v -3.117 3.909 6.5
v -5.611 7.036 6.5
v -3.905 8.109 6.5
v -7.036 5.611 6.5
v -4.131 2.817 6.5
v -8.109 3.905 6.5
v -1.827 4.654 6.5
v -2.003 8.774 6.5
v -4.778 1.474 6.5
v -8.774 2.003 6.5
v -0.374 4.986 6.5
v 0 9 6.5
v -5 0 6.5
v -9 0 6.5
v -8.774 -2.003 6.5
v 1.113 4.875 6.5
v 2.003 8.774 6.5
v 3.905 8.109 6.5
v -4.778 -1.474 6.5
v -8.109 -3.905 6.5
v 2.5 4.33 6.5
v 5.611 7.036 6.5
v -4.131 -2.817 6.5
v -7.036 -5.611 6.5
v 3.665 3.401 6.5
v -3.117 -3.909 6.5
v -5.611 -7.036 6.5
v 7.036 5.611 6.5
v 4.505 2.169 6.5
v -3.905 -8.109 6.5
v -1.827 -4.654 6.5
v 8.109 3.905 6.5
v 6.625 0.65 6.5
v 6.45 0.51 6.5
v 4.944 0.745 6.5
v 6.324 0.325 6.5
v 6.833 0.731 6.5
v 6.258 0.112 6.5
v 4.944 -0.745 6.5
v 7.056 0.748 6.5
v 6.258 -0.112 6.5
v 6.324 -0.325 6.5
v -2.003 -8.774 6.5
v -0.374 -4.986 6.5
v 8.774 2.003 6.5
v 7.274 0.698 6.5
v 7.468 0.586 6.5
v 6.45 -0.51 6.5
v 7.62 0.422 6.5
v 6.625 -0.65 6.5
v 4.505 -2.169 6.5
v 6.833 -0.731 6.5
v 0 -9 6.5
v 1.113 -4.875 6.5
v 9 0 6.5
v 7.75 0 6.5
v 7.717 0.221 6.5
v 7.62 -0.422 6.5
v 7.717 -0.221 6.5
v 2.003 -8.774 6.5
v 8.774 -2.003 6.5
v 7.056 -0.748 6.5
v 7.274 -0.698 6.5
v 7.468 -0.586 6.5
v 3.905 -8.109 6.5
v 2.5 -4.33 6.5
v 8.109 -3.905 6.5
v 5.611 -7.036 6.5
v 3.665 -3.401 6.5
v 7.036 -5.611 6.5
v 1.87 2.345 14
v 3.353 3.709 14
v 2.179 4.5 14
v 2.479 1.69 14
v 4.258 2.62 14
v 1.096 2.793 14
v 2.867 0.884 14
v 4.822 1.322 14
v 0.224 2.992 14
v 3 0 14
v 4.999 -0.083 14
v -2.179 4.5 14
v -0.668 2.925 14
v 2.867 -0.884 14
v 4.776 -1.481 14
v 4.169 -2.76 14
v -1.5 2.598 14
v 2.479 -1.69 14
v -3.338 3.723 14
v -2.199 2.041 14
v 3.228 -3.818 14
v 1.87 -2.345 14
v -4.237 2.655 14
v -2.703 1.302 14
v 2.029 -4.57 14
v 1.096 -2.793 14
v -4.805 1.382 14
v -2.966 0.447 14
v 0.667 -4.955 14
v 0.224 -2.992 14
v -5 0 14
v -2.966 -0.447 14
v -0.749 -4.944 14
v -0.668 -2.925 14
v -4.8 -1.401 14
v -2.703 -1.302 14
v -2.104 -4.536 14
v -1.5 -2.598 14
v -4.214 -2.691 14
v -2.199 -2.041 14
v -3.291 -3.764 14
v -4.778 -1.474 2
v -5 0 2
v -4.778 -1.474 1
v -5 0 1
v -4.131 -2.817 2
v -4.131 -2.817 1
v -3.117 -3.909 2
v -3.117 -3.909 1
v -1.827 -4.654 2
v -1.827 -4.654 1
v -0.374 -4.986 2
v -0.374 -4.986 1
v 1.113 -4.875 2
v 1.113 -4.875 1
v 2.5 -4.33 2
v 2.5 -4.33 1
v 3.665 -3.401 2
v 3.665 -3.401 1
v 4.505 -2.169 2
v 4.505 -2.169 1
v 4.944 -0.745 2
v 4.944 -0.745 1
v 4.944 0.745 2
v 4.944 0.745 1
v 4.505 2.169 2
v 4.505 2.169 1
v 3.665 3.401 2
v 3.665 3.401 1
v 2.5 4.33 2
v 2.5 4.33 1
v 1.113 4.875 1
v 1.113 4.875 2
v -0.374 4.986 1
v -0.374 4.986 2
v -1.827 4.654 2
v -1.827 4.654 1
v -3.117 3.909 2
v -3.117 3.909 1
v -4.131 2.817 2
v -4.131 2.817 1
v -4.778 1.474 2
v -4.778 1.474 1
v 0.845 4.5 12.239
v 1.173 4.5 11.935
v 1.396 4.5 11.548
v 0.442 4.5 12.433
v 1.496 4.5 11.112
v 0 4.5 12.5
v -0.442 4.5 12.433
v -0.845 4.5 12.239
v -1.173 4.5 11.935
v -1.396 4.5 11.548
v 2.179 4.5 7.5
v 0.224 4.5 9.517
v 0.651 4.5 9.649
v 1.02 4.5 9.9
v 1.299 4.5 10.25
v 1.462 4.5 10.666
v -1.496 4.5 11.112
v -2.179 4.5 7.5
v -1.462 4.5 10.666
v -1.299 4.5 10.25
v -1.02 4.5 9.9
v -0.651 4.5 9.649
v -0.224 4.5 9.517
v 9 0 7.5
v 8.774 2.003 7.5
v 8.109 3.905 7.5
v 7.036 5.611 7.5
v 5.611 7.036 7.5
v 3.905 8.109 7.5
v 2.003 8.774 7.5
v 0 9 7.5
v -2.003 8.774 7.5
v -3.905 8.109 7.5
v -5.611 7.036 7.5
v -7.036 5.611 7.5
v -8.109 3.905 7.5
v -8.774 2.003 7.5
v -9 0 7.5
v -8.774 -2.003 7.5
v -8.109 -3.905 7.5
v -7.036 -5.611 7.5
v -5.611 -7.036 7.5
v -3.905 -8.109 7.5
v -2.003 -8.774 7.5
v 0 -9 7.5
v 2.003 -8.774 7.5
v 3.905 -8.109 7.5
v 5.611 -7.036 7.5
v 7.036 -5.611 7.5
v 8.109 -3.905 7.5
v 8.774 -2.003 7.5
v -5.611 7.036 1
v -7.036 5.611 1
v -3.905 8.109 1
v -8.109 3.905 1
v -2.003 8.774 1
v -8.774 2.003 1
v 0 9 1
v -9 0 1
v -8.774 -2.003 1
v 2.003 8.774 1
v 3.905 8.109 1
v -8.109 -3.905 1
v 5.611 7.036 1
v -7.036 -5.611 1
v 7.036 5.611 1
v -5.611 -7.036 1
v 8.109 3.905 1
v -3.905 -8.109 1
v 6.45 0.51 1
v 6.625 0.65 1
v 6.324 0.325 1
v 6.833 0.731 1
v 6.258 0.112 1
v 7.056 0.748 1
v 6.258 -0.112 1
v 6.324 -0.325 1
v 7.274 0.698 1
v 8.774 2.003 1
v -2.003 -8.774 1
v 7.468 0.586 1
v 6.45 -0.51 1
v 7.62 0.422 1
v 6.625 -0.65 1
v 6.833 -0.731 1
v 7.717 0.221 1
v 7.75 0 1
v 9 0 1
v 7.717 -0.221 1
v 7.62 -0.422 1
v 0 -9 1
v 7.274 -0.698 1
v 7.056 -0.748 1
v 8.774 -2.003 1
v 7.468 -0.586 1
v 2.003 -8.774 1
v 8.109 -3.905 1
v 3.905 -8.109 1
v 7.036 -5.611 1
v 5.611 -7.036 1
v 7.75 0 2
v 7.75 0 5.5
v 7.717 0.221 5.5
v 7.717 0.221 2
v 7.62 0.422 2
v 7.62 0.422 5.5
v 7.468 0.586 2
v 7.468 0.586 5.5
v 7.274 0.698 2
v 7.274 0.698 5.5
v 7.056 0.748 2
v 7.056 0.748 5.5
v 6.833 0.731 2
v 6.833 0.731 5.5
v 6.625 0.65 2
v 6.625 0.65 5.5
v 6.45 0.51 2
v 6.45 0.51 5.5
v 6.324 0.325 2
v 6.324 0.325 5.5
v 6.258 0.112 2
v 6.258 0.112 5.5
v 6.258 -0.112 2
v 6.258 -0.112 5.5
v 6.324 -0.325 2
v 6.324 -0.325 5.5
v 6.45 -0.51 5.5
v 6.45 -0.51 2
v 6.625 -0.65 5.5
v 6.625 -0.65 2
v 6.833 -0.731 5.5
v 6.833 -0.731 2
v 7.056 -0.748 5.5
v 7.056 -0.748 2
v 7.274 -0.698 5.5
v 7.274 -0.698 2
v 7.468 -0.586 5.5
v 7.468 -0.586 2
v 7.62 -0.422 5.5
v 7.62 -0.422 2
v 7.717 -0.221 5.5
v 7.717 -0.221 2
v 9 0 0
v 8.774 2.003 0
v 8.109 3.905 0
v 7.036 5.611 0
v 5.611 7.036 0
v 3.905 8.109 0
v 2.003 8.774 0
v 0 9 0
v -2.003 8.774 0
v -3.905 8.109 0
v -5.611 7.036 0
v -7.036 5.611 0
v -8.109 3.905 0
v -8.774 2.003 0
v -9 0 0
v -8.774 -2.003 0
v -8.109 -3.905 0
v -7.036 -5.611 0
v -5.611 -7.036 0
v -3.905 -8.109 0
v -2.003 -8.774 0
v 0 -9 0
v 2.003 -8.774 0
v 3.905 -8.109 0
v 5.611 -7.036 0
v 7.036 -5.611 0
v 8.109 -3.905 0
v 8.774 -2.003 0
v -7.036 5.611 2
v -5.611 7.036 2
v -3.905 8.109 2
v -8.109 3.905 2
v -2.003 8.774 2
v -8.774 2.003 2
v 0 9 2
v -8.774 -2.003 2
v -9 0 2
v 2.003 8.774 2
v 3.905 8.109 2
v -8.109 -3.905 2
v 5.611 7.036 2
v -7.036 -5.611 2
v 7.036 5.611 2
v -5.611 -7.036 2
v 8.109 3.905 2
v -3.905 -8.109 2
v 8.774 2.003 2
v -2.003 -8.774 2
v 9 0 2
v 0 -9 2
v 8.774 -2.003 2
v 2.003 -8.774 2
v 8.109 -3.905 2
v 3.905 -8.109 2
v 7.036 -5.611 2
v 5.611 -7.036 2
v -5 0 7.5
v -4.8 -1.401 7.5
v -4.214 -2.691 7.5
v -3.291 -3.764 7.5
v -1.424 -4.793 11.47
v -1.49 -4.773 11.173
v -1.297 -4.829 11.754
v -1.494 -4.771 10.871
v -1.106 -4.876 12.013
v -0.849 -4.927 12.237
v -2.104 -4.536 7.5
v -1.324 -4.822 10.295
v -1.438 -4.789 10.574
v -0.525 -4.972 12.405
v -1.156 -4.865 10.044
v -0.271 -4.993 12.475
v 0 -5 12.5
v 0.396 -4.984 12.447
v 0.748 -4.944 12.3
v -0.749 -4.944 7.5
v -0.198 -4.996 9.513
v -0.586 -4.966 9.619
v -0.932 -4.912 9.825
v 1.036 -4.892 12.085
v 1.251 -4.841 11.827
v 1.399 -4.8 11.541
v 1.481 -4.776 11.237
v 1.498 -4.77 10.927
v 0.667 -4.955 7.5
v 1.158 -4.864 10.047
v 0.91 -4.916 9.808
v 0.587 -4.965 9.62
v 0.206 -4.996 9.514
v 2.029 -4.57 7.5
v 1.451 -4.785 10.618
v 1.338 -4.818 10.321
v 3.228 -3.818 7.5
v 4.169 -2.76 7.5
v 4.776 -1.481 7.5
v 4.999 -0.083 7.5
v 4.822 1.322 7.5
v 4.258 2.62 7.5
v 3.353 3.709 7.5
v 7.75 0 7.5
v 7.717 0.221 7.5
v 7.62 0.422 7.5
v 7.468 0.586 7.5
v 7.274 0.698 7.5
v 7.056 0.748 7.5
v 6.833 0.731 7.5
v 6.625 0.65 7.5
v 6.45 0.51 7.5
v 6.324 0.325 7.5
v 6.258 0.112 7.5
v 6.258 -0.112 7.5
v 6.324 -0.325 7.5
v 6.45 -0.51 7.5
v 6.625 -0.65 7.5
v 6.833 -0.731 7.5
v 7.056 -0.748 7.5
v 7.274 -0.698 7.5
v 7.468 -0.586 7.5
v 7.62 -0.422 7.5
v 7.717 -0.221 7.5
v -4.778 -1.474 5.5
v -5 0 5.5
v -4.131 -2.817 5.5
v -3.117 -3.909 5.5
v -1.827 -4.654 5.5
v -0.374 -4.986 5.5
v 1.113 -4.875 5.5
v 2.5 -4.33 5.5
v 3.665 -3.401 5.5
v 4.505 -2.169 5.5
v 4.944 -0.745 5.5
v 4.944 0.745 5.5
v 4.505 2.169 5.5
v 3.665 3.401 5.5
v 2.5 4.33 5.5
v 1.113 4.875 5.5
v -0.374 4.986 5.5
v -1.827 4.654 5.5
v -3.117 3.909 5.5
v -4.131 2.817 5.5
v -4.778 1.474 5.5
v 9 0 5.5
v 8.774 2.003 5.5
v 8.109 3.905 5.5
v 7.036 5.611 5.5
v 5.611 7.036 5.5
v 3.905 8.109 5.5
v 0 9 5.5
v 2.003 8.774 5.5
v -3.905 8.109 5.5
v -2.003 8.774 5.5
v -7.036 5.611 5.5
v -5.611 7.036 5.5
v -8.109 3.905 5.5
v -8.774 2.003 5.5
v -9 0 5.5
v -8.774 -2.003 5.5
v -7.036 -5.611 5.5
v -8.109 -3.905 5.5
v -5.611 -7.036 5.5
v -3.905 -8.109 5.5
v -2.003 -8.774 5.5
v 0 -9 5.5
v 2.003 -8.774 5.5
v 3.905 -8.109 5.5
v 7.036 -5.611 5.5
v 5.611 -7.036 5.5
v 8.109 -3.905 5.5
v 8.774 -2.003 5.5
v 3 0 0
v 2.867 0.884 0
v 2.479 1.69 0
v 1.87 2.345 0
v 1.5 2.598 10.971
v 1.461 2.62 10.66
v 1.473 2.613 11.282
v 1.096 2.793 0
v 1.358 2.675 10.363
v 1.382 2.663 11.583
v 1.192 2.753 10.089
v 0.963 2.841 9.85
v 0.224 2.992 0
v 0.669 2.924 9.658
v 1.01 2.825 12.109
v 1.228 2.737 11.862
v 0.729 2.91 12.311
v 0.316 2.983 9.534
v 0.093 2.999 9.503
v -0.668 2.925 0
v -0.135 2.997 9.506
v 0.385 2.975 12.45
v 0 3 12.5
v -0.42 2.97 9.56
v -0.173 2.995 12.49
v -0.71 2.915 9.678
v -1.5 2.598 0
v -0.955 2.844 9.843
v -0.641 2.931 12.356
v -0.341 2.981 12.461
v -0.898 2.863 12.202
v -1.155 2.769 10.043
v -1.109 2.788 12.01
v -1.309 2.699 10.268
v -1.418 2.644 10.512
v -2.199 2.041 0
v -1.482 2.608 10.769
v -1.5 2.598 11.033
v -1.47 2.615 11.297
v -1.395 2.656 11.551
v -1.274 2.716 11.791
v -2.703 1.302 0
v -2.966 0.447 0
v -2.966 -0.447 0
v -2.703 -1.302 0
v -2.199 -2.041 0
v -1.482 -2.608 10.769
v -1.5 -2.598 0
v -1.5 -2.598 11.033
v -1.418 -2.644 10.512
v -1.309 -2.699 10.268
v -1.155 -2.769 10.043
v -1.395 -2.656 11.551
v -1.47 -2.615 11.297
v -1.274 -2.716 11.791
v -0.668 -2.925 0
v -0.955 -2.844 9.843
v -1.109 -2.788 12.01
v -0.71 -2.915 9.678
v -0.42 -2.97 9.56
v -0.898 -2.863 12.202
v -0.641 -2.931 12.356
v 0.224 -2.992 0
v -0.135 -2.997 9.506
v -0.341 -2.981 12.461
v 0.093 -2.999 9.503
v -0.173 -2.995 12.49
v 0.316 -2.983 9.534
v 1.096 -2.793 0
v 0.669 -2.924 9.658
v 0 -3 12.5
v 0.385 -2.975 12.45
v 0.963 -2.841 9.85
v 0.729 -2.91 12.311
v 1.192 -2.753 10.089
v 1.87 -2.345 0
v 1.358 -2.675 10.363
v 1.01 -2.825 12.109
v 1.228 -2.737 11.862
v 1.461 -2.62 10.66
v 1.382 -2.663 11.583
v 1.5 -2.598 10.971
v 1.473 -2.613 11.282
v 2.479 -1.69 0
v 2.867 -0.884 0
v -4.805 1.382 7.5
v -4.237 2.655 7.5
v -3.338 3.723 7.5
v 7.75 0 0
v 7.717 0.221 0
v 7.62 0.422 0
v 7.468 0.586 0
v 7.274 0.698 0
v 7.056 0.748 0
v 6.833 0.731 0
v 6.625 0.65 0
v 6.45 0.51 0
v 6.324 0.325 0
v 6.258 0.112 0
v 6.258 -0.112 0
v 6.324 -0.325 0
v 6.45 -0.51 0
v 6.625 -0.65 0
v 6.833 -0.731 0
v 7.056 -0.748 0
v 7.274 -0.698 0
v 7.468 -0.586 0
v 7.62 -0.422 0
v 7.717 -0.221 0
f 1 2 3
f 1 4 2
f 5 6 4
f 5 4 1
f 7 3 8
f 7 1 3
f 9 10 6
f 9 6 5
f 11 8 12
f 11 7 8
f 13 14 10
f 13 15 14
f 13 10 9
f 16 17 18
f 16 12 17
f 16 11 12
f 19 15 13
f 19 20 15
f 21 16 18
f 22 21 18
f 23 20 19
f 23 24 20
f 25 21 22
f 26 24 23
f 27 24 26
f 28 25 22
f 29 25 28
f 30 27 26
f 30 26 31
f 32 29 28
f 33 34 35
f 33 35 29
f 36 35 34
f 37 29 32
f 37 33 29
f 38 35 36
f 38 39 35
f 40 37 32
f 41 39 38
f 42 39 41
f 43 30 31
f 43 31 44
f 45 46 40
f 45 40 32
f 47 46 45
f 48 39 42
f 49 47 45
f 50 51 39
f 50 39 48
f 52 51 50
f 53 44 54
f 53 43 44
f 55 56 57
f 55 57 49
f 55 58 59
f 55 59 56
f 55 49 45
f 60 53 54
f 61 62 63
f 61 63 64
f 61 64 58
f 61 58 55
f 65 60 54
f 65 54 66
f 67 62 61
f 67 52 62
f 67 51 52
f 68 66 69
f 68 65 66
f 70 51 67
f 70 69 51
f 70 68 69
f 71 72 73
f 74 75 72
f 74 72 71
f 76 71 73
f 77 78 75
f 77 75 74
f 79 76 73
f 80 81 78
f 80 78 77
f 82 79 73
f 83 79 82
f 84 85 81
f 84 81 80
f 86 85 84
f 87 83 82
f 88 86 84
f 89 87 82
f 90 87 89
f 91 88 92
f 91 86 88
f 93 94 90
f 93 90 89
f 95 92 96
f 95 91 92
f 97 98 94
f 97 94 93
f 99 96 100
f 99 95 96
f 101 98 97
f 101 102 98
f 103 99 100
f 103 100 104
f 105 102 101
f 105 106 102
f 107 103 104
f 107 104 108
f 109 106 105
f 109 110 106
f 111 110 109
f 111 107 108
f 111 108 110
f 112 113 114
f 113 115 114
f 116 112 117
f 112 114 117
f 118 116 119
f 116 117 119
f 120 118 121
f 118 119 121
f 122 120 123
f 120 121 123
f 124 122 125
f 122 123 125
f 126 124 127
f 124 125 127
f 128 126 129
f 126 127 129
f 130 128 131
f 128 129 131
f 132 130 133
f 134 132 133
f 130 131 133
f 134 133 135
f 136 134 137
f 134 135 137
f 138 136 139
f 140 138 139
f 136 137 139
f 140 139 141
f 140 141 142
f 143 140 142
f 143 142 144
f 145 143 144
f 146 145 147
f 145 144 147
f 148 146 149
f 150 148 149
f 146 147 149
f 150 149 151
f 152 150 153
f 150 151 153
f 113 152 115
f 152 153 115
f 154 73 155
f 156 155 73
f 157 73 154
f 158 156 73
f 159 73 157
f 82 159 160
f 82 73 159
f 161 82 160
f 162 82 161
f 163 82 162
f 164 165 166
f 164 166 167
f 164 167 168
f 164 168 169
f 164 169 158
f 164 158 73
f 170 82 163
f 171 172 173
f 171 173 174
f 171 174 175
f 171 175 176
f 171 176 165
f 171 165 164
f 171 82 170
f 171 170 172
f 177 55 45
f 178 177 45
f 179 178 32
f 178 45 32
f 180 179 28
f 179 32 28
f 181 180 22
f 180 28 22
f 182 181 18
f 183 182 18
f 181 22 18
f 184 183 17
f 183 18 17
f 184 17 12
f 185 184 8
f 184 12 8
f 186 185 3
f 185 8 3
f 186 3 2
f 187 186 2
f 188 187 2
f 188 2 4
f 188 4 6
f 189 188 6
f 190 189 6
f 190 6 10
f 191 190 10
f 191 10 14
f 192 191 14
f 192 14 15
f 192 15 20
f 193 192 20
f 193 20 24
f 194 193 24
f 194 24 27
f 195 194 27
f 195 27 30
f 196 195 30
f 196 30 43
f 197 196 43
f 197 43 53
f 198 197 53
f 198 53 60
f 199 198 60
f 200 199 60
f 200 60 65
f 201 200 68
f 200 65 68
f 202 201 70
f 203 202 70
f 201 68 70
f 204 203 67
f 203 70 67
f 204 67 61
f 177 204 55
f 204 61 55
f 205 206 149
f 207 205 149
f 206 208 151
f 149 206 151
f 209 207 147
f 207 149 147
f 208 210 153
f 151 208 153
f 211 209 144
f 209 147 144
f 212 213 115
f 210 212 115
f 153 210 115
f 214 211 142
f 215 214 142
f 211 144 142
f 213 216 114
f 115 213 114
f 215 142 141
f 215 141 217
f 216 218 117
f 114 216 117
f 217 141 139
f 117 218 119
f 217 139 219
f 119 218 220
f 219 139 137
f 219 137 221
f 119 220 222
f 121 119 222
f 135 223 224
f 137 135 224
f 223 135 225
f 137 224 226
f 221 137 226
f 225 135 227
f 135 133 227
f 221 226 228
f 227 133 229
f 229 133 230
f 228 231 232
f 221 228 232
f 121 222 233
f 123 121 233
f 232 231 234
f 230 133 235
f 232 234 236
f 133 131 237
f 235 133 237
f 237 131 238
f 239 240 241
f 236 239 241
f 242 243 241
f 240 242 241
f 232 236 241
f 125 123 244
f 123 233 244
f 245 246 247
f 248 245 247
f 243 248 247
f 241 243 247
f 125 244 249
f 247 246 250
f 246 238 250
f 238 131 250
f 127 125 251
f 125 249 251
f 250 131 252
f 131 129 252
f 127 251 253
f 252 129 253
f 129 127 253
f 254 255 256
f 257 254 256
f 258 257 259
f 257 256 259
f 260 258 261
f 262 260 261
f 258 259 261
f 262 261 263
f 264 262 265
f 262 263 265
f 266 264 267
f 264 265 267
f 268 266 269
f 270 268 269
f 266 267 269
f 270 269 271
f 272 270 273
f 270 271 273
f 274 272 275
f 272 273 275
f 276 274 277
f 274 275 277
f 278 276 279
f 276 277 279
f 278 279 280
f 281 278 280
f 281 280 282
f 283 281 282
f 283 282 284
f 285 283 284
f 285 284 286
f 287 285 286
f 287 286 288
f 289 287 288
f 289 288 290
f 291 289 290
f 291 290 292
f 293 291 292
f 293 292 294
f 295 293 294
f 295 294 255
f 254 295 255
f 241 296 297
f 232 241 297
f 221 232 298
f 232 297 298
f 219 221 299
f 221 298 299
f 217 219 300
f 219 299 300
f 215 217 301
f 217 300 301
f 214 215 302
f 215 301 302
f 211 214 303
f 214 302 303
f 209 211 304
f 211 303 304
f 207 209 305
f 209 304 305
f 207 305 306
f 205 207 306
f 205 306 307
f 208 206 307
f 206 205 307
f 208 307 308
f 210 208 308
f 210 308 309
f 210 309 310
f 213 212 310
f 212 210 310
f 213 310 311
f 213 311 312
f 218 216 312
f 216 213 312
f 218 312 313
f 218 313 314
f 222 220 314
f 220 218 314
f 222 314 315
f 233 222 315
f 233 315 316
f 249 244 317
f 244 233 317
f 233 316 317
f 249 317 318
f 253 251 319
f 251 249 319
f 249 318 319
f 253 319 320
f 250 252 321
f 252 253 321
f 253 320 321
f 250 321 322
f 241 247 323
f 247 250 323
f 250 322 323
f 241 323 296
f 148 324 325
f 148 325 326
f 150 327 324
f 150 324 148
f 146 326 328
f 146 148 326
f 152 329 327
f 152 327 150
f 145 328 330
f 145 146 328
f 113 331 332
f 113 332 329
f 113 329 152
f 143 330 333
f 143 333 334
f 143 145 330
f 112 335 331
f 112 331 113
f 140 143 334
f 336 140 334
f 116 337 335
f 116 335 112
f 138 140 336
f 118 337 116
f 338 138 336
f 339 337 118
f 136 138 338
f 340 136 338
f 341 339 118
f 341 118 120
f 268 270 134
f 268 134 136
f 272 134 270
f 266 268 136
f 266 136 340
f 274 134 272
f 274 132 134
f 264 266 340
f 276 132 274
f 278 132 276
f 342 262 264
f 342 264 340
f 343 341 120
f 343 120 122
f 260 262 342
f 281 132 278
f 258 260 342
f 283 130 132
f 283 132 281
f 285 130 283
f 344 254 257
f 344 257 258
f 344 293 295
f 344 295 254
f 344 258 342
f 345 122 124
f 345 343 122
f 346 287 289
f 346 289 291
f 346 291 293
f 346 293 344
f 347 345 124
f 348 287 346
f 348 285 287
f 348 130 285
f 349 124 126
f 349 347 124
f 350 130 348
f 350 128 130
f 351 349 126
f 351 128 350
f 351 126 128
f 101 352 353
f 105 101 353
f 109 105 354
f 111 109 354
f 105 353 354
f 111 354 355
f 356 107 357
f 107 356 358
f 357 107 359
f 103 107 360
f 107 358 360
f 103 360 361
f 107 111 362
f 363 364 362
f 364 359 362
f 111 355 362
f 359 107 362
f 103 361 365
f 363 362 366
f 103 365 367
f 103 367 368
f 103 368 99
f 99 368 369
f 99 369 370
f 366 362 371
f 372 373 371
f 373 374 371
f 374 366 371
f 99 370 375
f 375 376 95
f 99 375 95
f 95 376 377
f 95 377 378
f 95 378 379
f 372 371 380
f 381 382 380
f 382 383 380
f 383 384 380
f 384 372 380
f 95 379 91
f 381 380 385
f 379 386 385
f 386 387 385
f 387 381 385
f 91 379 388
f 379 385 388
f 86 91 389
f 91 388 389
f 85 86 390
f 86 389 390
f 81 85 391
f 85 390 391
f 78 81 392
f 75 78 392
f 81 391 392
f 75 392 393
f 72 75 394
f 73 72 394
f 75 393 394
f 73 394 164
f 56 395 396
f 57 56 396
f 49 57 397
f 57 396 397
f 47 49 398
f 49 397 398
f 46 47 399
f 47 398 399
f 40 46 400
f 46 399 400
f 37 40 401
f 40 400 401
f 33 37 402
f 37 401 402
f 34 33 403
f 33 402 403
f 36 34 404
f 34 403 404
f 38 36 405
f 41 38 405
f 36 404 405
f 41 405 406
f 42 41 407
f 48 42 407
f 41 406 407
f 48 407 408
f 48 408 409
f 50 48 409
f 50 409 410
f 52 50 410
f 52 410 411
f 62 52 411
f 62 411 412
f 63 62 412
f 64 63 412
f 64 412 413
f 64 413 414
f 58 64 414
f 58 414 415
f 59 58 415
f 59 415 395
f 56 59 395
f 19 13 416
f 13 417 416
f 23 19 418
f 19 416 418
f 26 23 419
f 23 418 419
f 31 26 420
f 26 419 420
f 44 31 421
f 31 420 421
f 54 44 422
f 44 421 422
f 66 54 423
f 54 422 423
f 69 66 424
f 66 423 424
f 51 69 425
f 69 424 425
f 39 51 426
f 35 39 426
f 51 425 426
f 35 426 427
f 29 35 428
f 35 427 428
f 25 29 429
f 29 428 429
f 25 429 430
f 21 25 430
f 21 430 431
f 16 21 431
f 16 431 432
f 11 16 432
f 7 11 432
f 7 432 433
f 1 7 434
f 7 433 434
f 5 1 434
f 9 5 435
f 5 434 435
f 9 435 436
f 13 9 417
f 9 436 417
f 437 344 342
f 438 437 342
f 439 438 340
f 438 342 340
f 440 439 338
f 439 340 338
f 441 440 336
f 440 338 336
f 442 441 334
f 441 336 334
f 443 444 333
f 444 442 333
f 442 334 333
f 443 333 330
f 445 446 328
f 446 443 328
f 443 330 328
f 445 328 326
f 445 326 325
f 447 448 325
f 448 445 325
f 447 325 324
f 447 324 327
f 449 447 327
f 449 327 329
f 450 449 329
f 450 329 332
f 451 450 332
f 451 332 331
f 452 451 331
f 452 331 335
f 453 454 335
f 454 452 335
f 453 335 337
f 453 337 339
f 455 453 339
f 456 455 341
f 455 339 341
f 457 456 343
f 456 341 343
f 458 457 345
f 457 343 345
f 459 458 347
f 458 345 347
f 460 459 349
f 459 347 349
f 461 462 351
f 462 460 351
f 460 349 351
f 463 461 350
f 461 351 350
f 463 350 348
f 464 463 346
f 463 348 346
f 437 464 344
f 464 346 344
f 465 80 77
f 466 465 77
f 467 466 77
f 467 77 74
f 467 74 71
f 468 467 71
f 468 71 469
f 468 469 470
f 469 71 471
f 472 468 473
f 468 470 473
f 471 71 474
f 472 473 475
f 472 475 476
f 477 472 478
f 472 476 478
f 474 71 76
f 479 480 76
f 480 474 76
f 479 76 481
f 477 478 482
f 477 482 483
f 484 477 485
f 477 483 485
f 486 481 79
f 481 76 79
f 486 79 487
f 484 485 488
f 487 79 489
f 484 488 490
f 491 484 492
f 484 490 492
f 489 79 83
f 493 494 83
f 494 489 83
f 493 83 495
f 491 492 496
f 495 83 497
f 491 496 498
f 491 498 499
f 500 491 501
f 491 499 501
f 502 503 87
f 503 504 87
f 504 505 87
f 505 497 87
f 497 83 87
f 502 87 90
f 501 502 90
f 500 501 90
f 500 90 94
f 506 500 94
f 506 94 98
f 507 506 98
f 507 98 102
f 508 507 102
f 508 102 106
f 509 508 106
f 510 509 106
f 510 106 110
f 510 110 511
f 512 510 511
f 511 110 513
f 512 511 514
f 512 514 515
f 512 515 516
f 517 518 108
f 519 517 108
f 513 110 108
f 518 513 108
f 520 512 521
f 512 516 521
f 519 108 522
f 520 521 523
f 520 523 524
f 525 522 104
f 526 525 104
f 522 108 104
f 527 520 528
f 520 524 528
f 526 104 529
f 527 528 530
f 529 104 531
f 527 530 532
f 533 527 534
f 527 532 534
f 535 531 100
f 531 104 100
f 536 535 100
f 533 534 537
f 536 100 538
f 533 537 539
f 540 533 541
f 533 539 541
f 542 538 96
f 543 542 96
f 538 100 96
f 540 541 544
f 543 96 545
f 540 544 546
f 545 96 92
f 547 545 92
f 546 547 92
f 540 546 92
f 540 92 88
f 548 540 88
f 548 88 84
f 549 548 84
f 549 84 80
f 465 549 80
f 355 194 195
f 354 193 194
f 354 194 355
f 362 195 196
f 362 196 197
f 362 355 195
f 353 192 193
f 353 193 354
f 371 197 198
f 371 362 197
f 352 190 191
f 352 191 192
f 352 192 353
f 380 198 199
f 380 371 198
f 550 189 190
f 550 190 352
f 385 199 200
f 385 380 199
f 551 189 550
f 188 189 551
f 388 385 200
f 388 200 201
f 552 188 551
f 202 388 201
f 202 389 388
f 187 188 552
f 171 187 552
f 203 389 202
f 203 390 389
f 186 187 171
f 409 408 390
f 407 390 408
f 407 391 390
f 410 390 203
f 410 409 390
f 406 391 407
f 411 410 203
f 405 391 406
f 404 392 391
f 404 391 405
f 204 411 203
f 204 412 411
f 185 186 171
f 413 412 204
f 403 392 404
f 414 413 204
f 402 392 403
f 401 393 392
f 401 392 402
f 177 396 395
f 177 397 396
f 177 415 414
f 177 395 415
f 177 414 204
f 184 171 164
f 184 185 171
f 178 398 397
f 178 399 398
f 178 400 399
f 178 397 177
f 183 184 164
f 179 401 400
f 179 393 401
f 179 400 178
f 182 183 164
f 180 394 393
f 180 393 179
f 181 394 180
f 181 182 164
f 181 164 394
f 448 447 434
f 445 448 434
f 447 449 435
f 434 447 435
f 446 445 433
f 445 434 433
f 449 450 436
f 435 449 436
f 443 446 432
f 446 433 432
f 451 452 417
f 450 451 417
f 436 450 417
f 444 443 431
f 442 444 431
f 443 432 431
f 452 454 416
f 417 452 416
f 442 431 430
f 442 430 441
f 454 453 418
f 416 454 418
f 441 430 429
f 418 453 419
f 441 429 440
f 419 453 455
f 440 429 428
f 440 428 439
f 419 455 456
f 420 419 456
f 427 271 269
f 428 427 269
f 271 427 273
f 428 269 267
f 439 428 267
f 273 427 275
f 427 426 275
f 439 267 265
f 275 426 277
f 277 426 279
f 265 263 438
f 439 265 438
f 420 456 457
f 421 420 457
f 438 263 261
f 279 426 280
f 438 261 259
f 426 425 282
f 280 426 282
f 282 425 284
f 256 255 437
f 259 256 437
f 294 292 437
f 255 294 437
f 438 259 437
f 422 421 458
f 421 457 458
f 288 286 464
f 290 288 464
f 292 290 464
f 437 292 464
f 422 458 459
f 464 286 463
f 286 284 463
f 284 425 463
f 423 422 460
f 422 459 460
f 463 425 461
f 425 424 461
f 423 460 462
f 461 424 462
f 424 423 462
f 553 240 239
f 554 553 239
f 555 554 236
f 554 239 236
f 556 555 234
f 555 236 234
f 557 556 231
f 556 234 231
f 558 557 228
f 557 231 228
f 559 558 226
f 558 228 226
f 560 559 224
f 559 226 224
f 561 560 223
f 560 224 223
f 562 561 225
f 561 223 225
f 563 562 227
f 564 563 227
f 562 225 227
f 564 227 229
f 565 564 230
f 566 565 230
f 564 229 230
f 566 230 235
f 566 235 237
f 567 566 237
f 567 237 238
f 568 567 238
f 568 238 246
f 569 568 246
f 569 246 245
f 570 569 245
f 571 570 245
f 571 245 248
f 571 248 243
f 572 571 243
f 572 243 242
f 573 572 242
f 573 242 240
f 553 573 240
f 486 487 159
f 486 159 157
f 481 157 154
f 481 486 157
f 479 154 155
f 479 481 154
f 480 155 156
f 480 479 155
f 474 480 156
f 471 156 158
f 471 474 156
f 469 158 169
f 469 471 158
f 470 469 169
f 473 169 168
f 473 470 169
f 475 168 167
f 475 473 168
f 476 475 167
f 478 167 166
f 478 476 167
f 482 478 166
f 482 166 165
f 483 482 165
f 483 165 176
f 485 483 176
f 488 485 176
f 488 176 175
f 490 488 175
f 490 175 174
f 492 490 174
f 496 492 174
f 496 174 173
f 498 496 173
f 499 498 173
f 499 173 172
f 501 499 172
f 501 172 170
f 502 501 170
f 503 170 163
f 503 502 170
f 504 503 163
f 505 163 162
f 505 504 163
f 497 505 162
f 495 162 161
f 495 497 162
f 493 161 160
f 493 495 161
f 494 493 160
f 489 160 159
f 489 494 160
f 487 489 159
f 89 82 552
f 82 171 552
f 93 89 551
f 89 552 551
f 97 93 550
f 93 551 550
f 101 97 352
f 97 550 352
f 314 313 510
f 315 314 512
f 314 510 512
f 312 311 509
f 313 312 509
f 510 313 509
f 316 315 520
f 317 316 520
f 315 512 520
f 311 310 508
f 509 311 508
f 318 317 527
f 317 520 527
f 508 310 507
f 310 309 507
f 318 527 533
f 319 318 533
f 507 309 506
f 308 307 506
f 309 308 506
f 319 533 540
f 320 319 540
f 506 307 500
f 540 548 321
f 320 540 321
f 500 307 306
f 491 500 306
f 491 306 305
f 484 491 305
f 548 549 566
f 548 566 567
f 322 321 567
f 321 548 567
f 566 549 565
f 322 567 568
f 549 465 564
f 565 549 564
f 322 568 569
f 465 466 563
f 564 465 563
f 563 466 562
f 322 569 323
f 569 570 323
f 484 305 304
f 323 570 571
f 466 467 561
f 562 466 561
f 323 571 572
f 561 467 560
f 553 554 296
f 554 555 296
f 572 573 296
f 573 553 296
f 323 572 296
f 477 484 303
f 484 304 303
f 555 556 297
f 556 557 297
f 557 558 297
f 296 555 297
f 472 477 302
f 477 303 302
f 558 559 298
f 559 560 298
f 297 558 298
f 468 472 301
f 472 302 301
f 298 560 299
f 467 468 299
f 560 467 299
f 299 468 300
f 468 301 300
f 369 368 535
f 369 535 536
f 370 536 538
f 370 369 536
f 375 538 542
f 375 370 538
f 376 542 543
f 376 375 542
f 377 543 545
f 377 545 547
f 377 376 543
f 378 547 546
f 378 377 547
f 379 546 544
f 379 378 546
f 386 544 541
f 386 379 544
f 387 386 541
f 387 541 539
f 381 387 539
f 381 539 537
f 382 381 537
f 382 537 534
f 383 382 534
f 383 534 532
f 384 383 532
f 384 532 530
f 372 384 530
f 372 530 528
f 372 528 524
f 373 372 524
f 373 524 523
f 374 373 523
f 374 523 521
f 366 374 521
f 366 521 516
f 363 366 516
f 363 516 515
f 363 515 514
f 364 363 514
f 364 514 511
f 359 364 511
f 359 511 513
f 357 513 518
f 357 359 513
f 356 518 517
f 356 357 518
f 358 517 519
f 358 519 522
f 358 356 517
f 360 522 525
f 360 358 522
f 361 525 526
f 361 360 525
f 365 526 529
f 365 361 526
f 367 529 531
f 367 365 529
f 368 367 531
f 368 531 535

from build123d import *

# Parameters (mm, degrees)
SKETCH_1_R               = 9
EXTRUDE_1_DEPTH          = 7.5
SKETCH_2_R               = 5
EXTRUDE_2_DEPTH          = 6.5
SKETCH_3_R               = 3
CUT_EXTRUDE_1_DEPTH      = 19.920887928
CUT_EXTRUDE_2_DEPTH      = 19.920887928
CUT_EXTRUDE_2_DEPTH_BACK = 19.920887928
SKETCH_4_R               = 1.5
SKETCH_5_W               = 4
SKETCH_5_H               = 1
SKETCH_6_R               = 0.75
CUT_EXTRUDE_3_DEPTH      = 10
CUT_EXTRUDE_4_DEPTH      = 19.920888002
CUT_EXTRUDE_4_DEPTH_BACK = 19.920888002
SKETCH_8_W               = 6.5
SKETCH_8_H               = 0.5


with BuildPart() as part:
    # 草图1 → 凸台-拉伸1 (new body)
    with BuildSketch(Plane.XY):
        Circle(SKETCH_1_R)
    extrude(amount=EXTRUDE_1_DEPTH)

    # 草图2 → 凸台-拉伸2 (add)
    with BuildSketch(Plane.XY.offset(7.5)):
        with Locations(Location((0, 0, 0), (0, 0, 180))):
            Circle(SKETCH_2_R)
    extrude(amount=EXTRUDE_2_DEPTH)

    # 草图3 → 切除-拉伸1 (cut, through all)
    with BuildSketch(Plane.XY.offset(14)):
        Circle(SKETCH_3_R)
    extrude(amount=-CUT_EXTRUDE_1_DEPTH, mode=Mode.SUBTRACT)

    # 草图4 → 切除-拉伸2 (cut, two sides: drawn at the far end of the back side and taken through both)
    with BuildSketch(Plane(origin=(0, 0, 0), x_dir=(1, 0, 0), z_dir=(0, 1, 0)).offset(-CUT_EXTRUDE_2_DEPTH_BACK)):
        with Locations(Location((0, -11, 0), (0, 0, 270))):
            Circle(SKETCH_4_R)
    extrude(amount=CUT_EXTRUDE_2_DEPTH + CUT_EXTRUDE_2_DEPTH_BACK, mode=Mode.SUBTRACT)

    # 草图5 → 切除-旋转1 (revolve, cut)
    with BuildSketch(Plane(origin=(0, 0, 0), x_dir=(1, 0, 0), z_dir=(0, 1, 0)), mode=Mode.PRIVATE) as cut_revolve_1_sk:
        with Locations((7, -1.5)):
            Rectangle(SKETCH_5_W, SKETCH_5_H)
        with Locations((7, -6)):
            Rectangle(SKETCH_5_W, SKETCH_5_H)
    revolve(cut_revolve_1_sk.sketch.rotate(Axis((0, 0, -0.802981009), (0, 0, 1)), 180), axis=Axis((0, 0, -0.802981009), (0, 0, 1)), mode=Mode.SUBTRACT)

    # 草图6 → 切除-拉伸3 (cut)
    with BuildSketch(Plane.XY.offset(7.5)):
        with Locations((7, 0)):
            Circle(SKETCH_6_R)
    extrude(amount=-CUT_EXTRUDE_3_DEPTH, mode=Mode.SUBTRACT)

    # 草图8 → 切除-拉伸4 (cut, two sides: drawn at the far end of the back side and taken through both)
    with BuildSketch(Plane(origin=(0, 0, 0), x_dir=(0, 0, -1), z_dir=(1, 0, 0)).offset(-CUT_EXTRUDE_4_DEPTH_BACK)):
        with Locations((-10.75, 4.75)):
            Rectangle(SKETCH_8_W, SKETCH_8_H)
    extrude(amount=CUT_EXTRUDE_4_DEPTH + CUT_EXTRUDE_4_DEPTH_BACK, mode=Mode.SUBTRACT)


solid = part.part
